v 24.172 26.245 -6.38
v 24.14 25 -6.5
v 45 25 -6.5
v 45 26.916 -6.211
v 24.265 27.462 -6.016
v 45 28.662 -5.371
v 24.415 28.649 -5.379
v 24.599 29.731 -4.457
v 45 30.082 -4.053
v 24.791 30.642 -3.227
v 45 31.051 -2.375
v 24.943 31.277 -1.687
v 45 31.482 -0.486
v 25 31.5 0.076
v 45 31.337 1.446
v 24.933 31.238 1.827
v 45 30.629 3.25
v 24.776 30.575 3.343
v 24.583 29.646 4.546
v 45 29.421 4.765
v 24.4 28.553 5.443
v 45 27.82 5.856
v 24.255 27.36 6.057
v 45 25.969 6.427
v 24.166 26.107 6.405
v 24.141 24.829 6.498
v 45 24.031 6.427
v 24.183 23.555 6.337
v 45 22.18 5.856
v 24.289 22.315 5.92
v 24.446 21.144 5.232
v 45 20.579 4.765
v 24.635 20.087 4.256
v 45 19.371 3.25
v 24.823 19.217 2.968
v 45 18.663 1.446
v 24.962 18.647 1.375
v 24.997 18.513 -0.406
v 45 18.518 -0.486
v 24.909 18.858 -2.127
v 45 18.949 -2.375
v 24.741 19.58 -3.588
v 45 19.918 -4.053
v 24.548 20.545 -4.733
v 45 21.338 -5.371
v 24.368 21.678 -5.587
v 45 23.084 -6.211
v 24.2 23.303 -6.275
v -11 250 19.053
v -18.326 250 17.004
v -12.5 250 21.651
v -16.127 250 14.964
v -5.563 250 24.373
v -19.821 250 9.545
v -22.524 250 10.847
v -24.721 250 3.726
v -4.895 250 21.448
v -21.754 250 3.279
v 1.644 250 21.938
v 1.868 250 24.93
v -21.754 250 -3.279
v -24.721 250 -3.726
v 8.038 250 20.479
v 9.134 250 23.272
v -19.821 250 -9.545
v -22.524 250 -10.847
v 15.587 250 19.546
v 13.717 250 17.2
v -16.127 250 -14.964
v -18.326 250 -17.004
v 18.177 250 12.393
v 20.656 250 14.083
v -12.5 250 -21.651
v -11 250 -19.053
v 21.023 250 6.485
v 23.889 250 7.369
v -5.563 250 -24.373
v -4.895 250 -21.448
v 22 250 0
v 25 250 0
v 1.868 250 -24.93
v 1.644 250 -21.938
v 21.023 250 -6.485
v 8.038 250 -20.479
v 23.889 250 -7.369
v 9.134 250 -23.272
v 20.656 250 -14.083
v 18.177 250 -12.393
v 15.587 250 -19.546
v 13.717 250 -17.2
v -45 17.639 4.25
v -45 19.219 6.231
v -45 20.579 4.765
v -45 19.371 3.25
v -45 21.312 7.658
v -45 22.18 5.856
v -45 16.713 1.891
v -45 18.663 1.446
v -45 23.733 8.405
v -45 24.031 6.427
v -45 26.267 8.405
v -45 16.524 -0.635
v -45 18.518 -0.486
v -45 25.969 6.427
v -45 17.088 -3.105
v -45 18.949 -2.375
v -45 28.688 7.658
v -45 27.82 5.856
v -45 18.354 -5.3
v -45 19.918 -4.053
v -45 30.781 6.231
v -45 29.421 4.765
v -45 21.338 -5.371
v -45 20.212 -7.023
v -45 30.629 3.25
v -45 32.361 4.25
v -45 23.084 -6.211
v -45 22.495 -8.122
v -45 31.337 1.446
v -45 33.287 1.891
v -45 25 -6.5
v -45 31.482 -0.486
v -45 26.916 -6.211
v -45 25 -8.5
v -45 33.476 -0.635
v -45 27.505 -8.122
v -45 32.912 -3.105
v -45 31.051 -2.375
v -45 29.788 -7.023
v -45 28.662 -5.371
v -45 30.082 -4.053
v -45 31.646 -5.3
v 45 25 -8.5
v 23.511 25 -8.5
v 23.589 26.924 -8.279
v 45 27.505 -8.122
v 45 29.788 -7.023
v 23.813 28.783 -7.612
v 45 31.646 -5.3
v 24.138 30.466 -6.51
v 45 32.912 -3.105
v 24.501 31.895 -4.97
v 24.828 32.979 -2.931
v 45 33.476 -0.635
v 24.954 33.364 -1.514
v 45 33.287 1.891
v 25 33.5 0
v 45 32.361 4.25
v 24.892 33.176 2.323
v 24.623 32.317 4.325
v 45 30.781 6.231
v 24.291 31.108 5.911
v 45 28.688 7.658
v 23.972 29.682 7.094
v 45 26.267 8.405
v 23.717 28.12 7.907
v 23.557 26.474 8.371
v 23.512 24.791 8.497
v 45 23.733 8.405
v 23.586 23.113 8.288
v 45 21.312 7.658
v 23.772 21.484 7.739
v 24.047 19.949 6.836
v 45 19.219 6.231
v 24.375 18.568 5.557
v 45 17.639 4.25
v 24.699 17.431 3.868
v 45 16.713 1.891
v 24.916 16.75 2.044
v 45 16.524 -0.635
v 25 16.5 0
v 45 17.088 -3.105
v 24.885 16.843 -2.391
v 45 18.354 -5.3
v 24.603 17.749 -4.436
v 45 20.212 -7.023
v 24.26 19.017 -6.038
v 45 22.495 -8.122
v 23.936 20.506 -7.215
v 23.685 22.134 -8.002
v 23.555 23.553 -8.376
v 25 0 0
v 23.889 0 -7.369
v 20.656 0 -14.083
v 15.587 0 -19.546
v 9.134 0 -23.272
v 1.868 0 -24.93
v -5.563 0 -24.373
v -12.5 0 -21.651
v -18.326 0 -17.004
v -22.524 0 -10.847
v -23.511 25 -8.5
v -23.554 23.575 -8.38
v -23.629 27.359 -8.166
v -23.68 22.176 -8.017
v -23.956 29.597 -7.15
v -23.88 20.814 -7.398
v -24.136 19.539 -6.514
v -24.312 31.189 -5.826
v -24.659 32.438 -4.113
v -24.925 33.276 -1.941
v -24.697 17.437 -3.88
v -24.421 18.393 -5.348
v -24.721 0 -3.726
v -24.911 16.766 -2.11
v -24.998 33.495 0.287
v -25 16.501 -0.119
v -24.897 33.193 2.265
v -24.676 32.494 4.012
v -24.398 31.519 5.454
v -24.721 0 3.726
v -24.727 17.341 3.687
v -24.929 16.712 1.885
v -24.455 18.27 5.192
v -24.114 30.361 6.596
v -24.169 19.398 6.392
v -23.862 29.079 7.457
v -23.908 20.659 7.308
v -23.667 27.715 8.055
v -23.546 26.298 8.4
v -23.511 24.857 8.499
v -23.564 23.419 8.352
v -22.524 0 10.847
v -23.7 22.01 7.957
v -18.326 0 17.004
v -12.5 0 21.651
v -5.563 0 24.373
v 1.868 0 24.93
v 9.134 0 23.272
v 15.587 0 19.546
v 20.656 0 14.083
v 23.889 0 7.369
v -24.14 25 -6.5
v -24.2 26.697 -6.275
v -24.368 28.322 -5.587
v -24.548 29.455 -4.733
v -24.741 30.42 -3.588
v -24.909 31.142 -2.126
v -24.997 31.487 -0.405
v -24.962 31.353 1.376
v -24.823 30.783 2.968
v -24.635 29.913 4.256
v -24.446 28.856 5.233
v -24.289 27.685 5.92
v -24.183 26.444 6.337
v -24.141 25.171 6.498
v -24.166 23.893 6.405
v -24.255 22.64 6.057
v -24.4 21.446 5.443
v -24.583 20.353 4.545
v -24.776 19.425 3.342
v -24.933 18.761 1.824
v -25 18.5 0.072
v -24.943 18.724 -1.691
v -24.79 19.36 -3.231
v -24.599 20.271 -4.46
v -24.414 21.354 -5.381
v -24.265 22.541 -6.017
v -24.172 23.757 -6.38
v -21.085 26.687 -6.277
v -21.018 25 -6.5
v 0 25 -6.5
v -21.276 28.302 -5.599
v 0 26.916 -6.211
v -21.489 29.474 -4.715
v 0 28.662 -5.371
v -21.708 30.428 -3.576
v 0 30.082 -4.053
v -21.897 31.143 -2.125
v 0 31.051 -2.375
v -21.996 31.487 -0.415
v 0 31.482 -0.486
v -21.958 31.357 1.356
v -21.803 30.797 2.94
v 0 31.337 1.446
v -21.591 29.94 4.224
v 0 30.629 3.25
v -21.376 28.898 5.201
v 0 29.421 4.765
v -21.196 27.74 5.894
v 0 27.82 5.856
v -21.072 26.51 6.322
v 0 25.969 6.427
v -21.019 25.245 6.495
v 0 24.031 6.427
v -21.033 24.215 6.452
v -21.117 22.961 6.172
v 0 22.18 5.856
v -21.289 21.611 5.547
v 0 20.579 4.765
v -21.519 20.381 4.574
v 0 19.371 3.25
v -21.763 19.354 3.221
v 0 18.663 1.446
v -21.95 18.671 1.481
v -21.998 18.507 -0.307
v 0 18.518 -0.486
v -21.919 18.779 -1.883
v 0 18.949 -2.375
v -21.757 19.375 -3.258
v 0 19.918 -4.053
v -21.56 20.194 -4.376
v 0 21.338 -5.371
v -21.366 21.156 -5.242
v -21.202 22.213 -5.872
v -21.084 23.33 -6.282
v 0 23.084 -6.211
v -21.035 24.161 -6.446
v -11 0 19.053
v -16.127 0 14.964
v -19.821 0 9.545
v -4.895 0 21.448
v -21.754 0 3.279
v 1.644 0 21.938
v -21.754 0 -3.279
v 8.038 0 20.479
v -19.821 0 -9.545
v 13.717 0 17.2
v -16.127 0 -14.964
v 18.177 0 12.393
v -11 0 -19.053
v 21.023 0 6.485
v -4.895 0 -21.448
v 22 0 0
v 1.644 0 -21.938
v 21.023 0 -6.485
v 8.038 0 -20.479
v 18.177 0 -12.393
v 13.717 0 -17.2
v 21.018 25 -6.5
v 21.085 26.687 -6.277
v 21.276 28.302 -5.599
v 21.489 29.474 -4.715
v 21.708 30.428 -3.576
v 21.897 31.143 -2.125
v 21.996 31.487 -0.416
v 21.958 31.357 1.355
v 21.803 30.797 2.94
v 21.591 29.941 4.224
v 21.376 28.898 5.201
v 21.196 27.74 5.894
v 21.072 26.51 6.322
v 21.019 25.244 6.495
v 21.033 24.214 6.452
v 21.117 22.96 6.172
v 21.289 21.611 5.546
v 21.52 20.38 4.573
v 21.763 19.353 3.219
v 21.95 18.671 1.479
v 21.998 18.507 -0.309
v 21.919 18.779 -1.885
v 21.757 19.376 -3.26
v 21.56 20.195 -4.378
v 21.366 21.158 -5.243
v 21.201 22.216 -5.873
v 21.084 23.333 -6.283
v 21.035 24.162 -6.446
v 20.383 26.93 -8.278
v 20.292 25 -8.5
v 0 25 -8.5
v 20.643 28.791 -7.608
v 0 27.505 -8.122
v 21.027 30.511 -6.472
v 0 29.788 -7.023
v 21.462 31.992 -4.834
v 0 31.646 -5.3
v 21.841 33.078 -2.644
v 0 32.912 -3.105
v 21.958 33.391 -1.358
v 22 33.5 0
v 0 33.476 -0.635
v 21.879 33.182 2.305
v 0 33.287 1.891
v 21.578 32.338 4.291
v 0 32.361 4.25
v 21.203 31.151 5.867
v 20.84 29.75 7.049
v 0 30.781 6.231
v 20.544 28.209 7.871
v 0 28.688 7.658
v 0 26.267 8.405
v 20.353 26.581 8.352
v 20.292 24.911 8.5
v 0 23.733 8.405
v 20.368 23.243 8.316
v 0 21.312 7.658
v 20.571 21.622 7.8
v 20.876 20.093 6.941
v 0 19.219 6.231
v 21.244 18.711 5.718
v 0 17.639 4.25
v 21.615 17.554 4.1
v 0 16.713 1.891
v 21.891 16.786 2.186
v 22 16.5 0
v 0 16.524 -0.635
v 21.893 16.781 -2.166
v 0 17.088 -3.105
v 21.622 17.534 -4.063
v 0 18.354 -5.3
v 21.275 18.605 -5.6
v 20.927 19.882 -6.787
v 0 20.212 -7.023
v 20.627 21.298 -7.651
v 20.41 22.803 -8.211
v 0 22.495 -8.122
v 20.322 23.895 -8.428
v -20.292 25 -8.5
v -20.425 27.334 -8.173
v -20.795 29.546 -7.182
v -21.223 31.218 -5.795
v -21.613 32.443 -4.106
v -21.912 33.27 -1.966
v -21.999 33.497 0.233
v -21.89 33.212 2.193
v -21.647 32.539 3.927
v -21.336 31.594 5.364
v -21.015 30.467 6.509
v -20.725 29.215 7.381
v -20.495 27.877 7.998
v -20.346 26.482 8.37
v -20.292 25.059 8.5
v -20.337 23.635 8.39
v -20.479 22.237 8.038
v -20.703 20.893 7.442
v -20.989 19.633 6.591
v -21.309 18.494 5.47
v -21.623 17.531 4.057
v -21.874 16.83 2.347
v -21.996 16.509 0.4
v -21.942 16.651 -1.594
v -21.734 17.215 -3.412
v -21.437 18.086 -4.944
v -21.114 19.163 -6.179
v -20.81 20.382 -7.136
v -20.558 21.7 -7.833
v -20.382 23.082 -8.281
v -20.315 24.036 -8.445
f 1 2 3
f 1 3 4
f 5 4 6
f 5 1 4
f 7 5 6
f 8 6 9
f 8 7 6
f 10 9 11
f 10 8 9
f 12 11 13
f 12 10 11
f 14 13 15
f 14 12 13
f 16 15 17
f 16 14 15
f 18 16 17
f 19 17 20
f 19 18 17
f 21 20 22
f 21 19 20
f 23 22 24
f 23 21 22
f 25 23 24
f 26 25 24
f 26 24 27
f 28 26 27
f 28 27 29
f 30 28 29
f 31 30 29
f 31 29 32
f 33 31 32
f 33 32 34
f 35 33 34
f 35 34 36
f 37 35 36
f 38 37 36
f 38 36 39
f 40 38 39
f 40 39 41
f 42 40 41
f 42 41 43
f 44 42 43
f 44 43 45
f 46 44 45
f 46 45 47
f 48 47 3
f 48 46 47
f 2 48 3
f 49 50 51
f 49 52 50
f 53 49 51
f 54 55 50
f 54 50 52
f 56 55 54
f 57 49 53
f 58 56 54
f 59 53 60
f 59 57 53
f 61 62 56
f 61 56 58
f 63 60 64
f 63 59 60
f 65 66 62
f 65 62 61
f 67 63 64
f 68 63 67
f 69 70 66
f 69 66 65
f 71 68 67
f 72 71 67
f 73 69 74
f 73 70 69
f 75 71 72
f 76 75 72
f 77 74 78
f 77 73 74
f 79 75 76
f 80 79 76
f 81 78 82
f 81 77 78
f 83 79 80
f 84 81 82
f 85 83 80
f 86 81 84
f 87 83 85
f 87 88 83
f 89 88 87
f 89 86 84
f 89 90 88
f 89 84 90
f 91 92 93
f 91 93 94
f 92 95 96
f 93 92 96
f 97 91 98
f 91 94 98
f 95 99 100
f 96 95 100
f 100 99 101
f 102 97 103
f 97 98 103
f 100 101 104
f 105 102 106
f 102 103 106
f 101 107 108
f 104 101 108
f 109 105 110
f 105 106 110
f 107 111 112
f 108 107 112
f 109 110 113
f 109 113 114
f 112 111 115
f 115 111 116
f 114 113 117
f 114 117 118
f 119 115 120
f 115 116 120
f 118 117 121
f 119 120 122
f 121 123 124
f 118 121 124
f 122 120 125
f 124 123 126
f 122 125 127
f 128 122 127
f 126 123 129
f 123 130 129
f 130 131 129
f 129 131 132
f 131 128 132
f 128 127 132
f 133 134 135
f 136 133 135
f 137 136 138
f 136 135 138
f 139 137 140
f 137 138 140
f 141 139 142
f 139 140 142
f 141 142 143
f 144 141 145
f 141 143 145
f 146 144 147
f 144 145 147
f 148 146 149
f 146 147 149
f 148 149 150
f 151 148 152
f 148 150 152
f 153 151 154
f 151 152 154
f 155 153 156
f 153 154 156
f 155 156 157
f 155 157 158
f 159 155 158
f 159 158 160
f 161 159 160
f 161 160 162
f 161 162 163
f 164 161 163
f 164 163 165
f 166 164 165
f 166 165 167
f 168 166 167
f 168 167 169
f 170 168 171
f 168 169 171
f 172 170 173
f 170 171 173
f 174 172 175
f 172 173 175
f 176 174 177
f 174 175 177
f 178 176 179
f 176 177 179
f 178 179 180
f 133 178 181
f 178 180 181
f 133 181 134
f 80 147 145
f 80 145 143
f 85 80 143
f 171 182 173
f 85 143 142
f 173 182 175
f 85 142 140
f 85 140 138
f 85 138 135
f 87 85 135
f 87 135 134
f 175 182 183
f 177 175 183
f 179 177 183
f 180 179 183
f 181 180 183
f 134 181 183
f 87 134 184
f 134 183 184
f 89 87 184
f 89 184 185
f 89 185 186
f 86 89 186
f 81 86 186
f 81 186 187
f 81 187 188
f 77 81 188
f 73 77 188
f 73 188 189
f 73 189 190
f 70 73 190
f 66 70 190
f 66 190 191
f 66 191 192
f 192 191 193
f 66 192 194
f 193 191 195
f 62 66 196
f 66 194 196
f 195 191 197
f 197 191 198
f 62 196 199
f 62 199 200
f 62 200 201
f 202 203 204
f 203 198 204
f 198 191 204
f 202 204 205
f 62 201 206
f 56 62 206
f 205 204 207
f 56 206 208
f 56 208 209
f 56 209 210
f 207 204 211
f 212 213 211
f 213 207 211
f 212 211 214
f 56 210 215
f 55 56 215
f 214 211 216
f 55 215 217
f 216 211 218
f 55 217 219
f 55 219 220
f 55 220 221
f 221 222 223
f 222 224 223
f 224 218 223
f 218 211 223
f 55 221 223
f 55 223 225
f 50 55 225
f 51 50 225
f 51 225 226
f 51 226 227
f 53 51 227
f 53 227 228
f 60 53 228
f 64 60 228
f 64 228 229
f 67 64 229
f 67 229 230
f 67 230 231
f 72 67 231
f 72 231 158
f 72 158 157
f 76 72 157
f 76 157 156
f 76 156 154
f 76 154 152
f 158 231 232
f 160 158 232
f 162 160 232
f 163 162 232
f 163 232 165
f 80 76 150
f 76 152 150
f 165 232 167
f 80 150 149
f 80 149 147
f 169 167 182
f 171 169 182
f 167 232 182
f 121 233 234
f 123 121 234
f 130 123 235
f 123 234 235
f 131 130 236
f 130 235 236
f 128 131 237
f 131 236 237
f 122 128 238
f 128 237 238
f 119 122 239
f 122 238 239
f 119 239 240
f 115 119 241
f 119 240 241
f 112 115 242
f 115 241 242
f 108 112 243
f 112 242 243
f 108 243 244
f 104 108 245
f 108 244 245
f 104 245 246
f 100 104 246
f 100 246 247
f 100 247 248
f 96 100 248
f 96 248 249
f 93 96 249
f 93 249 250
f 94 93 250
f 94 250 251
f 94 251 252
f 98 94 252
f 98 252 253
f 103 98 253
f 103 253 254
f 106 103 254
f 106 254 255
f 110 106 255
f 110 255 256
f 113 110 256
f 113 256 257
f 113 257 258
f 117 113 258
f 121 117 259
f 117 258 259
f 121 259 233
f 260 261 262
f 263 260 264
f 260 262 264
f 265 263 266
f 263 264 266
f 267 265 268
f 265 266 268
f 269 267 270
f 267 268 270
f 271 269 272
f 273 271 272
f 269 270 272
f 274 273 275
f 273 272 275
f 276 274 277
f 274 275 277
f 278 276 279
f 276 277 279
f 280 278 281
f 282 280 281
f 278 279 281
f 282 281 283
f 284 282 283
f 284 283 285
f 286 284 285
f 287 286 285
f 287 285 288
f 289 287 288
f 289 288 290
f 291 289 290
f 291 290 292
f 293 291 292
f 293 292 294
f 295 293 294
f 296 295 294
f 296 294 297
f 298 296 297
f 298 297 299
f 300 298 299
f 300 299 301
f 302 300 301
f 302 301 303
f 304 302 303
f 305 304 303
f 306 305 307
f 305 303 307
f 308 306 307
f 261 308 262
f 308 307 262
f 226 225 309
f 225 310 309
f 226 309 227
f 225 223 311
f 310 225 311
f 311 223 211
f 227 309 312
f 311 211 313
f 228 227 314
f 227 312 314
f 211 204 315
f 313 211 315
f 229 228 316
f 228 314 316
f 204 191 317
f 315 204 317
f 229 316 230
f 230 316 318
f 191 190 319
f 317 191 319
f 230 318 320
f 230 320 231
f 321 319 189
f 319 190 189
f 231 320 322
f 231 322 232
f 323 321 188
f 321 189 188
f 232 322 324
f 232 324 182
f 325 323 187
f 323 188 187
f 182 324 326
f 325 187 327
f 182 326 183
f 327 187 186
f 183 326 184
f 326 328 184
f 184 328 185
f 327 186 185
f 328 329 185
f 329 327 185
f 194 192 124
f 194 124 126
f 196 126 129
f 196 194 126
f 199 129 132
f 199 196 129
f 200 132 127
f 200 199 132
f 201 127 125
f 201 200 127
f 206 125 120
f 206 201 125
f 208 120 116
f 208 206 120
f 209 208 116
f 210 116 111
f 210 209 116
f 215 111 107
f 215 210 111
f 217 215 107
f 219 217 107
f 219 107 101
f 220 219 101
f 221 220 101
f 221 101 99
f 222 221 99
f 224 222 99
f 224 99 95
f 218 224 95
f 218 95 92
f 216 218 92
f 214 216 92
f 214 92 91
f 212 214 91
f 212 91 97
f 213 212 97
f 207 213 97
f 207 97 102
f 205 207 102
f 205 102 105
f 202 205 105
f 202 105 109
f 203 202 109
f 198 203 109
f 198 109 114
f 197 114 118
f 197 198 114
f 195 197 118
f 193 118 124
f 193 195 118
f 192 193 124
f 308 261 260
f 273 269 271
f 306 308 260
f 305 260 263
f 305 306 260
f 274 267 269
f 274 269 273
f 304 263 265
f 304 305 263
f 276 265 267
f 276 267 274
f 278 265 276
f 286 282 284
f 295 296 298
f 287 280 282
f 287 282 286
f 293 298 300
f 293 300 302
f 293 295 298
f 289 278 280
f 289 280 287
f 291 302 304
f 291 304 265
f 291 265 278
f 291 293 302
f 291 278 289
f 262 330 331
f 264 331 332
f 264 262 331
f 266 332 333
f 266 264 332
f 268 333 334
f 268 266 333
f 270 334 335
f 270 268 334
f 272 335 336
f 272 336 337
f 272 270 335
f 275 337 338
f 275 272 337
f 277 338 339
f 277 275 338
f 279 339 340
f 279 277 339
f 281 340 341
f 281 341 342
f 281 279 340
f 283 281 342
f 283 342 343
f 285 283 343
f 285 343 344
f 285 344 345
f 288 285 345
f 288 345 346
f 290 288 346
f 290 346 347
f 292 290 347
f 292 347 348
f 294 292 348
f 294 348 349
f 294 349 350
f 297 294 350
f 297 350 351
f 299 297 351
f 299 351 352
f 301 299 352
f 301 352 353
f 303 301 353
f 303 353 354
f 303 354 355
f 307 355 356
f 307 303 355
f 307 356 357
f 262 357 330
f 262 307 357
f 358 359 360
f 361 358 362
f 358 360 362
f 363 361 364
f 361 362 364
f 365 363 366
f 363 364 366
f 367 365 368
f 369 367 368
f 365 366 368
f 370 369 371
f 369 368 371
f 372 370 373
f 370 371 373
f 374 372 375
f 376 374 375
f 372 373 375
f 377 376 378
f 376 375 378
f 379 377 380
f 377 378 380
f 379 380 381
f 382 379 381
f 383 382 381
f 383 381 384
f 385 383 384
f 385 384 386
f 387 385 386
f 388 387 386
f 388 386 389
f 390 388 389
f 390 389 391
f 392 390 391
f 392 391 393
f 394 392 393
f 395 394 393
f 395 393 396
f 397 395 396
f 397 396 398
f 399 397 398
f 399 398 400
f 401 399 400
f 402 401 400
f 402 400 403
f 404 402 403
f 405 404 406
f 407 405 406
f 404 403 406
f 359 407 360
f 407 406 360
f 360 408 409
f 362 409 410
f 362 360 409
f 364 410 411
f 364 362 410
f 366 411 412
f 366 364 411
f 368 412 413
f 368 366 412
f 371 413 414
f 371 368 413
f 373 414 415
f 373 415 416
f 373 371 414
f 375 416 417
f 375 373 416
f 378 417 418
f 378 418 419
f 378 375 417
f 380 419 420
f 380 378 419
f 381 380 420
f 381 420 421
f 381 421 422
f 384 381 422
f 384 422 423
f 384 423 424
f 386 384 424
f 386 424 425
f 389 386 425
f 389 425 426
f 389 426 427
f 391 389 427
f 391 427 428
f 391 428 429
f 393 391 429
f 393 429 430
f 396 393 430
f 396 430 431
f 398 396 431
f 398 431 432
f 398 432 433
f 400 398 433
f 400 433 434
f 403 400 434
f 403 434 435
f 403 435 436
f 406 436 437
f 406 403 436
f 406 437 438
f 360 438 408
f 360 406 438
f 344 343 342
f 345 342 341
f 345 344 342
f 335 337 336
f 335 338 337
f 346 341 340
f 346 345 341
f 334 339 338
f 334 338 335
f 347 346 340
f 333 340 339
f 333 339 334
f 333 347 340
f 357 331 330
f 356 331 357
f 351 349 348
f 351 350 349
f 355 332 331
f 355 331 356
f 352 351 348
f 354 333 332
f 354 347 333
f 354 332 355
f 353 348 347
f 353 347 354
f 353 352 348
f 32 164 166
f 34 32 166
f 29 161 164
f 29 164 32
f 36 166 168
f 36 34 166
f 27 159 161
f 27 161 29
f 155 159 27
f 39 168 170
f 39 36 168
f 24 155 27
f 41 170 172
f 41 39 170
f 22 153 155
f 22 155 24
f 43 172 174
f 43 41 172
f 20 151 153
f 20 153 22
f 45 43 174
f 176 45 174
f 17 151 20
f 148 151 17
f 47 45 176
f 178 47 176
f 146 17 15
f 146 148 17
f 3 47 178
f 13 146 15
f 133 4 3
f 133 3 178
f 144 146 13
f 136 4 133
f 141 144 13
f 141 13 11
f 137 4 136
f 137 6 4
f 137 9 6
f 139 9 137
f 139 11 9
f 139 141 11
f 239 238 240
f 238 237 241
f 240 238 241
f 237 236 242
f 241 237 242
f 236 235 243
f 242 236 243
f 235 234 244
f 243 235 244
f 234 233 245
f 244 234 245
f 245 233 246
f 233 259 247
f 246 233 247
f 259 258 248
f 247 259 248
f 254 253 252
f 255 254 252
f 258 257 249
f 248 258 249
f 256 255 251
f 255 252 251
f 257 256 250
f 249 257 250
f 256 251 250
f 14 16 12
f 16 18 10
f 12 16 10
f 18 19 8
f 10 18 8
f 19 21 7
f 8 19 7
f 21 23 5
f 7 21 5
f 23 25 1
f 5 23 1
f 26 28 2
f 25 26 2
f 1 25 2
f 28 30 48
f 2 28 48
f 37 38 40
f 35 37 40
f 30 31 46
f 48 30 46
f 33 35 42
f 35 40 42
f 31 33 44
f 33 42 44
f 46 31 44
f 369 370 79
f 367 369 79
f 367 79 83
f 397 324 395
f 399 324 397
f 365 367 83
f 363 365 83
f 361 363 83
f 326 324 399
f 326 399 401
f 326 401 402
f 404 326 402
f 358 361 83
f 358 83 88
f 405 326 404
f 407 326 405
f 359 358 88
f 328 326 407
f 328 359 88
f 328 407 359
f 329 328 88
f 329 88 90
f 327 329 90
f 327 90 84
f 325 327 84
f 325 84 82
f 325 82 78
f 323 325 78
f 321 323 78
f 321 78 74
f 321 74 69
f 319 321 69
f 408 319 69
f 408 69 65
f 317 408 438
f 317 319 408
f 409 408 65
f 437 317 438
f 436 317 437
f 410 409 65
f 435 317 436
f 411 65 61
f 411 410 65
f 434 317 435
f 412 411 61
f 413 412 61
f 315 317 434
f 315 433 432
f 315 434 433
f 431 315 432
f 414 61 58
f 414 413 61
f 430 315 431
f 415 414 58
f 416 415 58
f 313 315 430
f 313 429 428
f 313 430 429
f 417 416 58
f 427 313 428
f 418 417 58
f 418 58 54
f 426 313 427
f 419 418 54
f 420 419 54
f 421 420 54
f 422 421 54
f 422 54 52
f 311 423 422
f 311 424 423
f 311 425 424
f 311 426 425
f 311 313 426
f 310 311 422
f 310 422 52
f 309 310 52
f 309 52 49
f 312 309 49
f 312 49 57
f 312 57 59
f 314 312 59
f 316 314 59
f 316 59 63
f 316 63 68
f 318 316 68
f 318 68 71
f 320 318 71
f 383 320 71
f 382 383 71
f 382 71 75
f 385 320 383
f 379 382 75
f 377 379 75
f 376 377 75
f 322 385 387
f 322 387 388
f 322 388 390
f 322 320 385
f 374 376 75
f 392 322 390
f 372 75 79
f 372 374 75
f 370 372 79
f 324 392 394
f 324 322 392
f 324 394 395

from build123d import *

# Parameters (mm, degrees)
SKETCH2_R                = 25
SKETCH2_R_2              = 22
BOSS_EXTRUDE1_DEPTH      = 250
SKETCH3_R                = 8.5
SKETCH3_R_2              = 6.5
BOSS_EXTRUDE2_DEPTH      = 45
BOSS_EXTRUDE2_DEPTH_BACK = 45


with BuildPart() as part:
    # Sketch2 → Boss-Extrude1 (new body)
    with BuildSketch(Plane(origin=(0, 0, 0), x_dir=(1, 0, 0), z_dir=(0, 1, 0))):
        Circle(SKETCH2_R)
        Circle(SKETCH2_R_2, mode=Mode.SUBTRACT)
    extrude(amount=BOSS_EXTRUDE1_DEPTH)

    # Sketch3 → Boss-Extrude2 (add, two sides)
    with BuildSketch(Plane(origin=(0, 0, 0), x_dir=(0, 0, -1), z_dir=(1, 0, 0))) as boss_extrude2_sk:
        with Locations((0, 25)):
            Circle(SKETCH3_R)
        with Locations((0, 25)):
            Circle(SKETCH3_R_2, mode=Mode.SUBTRACT)
    extrude(amount=BOSS_EXTRUDE2_DEPTH)
    extrude(boss_extrude2_sk.sketch, amount=-BOSS_EXTRUDE2_DEPTH_BACK)


solid = part.part
